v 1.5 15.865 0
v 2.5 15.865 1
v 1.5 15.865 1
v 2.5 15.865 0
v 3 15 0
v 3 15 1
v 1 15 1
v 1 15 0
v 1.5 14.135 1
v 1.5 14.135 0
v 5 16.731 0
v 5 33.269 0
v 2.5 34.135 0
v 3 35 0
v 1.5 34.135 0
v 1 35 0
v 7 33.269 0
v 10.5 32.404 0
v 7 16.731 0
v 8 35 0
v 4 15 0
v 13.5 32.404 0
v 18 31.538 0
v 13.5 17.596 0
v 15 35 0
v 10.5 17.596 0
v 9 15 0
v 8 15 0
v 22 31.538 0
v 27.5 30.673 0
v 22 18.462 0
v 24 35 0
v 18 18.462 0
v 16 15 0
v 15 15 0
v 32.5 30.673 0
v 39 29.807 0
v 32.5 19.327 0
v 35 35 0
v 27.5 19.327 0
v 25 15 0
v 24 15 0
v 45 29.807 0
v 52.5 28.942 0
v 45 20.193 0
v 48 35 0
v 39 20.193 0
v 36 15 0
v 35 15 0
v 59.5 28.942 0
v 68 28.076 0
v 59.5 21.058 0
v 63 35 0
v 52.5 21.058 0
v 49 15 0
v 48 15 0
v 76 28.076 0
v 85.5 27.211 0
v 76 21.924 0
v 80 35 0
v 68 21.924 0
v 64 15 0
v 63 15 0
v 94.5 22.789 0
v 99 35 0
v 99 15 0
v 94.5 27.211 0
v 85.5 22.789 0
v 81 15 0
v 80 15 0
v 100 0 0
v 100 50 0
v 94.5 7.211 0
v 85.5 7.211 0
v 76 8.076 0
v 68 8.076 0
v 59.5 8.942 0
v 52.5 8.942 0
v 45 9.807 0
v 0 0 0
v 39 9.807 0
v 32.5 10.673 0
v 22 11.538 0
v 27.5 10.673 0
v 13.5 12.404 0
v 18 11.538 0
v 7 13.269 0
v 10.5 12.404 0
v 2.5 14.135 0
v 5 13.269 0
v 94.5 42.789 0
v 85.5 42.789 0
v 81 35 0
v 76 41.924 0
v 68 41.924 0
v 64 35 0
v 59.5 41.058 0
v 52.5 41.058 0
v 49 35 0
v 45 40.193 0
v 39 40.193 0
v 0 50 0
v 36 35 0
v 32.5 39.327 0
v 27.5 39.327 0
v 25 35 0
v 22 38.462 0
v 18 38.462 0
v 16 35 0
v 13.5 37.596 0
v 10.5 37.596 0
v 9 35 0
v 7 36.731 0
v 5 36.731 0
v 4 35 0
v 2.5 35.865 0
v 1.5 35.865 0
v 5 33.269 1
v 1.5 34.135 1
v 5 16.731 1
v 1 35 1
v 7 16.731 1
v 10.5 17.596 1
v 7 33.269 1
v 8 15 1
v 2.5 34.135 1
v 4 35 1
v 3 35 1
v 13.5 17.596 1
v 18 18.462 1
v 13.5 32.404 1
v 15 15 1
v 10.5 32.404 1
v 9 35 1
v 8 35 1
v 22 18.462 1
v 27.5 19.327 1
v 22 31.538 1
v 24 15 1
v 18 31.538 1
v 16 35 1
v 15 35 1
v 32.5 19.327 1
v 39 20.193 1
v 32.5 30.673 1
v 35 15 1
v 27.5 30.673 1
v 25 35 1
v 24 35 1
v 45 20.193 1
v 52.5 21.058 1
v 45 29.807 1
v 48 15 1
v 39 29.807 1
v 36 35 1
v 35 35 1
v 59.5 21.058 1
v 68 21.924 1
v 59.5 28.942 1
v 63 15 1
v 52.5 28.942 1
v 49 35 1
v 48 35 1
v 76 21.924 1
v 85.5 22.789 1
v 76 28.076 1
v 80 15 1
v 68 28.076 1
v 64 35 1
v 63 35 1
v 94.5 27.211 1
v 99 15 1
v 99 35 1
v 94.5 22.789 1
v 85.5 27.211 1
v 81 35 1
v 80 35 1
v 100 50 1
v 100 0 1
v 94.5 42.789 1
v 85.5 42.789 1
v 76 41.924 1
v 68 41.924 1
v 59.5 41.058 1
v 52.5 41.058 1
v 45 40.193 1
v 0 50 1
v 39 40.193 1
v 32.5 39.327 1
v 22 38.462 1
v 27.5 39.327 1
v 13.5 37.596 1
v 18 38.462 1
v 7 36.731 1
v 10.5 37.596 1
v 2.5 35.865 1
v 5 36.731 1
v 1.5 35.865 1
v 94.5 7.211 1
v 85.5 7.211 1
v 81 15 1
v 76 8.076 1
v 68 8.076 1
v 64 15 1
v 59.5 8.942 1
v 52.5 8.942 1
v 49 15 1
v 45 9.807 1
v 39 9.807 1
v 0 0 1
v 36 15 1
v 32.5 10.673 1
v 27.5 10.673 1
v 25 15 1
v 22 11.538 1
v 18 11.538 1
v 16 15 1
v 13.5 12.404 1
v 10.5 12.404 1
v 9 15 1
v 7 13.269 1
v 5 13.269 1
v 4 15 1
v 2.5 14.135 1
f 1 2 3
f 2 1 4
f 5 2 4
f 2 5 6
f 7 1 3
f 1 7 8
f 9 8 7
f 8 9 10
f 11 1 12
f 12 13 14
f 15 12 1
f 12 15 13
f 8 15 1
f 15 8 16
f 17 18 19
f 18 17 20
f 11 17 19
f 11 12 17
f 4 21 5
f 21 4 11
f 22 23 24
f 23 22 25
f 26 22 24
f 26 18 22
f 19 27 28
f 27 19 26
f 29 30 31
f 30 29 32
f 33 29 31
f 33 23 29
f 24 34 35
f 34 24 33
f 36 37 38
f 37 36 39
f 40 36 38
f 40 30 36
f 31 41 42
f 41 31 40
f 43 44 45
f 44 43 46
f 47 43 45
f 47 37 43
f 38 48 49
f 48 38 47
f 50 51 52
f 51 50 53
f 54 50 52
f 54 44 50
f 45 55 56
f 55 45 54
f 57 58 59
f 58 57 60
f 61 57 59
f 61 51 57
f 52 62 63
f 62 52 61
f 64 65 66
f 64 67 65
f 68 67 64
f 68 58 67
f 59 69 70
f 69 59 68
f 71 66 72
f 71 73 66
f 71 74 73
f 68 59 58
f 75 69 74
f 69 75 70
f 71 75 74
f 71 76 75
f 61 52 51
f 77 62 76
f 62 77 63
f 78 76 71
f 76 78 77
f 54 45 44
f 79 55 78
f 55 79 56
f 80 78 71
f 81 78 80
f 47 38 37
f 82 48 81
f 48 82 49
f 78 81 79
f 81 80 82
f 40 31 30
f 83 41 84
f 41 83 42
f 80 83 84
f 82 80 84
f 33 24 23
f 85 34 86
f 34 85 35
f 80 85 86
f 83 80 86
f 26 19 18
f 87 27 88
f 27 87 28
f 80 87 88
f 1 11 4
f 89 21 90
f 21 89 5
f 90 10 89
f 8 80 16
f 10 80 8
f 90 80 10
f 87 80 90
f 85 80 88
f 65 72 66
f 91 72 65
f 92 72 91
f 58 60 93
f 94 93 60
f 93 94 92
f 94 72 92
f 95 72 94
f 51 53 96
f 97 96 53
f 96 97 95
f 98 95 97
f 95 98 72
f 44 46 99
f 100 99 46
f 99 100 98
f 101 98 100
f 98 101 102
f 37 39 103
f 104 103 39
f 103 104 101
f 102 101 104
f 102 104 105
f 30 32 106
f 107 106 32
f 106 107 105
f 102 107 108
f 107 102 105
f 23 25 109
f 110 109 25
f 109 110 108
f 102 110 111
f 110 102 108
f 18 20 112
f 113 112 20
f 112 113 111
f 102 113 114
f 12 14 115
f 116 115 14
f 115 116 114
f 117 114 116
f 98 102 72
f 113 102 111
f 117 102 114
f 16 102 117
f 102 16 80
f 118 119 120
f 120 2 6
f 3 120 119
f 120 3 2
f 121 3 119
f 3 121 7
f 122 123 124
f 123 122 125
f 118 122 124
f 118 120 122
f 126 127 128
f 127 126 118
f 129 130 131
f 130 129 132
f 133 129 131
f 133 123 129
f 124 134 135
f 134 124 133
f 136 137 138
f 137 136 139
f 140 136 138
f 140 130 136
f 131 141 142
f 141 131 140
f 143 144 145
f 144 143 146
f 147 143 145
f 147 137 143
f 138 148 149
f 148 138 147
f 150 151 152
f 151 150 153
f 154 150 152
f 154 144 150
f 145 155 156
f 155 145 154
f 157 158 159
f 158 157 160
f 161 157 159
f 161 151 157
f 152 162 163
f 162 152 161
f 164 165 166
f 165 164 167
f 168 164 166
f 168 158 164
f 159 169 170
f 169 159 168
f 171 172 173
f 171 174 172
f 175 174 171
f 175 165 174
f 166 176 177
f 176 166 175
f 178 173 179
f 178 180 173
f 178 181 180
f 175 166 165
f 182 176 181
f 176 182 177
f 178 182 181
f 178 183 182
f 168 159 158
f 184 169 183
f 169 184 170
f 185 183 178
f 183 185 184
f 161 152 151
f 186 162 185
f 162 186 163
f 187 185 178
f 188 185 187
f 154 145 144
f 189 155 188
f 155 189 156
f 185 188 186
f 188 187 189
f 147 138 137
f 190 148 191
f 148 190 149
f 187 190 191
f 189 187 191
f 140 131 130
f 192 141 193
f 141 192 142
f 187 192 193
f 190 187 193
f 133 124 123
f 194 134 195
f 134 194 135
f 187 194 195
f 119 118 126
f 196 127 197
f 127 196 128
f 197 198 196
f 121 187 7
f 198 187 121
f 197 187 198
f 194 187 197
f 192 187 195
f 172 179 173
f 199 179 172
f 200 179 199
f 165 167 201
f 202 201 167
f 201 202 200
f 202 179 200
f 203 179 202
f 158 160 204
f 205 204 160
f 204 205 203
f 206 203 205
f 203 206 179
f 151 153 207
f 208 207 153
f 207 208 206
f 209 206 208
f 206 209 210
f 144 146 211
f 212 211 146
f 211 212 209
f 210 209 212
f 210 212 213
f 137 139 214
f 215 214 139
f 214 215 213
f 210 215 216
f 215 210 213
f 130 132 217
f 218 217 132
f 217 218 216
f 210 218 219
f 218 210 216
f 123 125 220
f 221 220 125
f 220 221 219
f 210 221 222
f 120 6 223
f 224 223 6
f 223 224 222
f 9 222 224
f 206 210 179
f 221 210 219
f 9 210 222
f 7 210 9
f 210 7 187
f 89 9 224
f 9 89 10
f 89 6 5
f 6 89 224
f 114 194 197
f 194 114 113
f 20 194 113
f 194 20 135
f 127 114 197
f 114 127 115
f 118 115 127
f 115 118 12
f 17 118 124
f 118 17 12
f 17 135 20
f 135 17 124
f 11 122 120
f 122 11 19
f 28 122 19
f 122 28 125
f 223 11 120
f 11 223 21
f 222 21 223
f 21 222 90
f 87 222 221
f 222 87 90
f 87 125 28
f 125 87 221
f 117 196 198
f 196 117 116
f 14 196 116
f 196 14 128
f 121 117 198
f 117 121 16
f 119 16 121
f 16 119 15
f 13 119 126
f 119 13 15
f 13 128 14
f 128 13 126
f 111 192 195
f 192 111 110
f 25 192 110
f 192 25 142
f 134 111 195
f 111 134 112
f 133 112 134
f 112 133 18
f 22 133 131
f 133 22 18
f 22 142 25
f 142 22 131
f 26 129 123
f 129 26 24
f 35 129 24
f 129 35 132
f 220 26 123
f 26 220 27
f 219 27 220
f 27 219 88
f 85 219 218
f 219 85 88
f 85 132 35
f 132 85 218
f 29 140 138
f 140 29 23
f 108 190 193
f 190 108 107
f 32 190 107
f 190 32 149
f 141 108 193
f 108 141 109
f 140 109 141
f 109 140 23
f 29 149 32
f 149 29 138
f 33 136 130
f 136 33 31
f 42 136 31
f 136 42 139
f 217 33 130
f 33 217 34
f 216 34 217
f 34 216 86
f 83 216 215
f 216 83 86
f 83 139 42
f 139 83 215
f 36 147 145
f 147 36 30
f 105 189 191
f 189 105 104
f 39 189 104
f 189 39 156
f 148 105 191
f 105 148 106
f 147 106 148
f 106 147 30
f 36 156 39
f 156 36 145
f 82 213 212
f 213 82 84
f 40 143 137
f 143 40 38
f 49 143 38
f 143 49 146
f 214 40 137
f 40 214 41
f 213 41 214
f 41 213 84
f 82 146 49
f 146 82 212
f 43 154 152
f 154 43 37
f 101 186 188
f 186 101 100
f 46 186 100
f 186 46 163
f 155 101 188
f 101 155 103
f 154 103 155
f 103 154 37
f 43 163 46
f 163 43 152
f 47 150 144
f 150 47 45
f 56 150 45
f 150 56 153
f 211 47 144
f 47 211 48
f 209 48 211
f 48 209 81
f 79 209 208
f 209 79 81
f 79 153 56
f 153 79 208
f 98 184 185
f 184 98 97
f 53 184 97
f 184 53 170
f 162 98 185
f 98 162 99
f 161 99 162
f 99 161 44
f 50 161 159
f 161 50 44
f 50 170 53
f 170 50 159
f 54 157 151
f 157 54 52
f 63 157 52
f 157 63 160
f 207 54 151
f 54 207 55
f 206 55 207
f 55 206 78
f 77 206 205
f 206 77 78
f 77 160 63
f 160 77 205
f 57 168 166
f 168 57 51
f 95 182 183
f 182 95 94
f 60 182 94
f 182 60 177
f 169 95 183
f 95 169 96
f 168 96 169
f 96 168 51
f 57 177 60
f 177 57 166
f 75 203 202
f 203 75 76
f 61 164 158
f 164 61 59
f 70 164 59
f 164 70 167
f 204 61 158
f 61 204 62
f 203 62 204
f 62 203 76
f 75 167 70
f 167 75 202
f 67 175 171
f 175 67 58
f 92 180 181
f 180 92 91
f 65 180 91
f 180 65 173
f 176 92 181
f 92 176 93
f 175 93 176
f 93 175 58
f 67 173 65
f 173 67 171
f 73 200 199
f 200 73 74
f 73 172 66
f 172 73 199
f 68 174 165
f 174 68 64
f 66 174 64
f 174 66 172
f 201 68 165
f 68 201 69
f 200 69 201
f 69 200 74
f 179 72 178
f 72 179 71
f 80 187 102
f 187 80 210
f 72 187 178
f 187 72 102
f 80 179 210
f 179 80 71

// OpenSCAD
difference() {
  translate([50.0000000000, 25.0000000000, 0.5000000000]) {
    scale([100.0000000000, 50.0000000000, 1.0000000000]) {
      translate([-0.5000000000, -0.5000000000, -0.5000000000]) {
        cube([1, 1, 1]);
      }
    }
  }
  union() {
    union() {
      union() {
        union() {
          union() {
            union() {
              union() {
                union() {
                  union() {
                    union() {
                      union() {
                        union() {
                          union() {
                            union() {
                              union() {
                                union() {
                                  union() {
                                    translate([2.0000000000, 15.0000000000, 0.5000000000]) {
                                      scale([2.0000000000, 1.7320000000, 1.0000000000]) {
                                        rotate([0.0000000000, 0.0000000000, -0.0000000000]) {
                                          scale([0.5, 0.577, 1]) cylinder($fn = 6, center = true);
                                        }
                                      }
                                    }
                                    translate([6.0000000000, 35.0000000000, 0.5000000000]) {
                                      scale([4.0000000000, 3.4640000000, 1.0000000000]) {
                                        rotate([0.0000000000, 0.0000000000, -0.0000000000]) {
                                          scale([0.5, 0.577, 1]) cylinder($fn = 6, center = true);
                                        }
                                      }
                                    }
                                  }
                                  translate([6.0000000000, 15.0000000000, 0.5000000000]) {
                                    scale([4.0000000000, 3.4640000000, 1.0000000000]) {
                                      rotate([0.0000000000, 0.0000000000, -0.0000000000]) {
                                        scale([0.5, 0.577, 1]) cylinder($fn = 6, center = true);
                                      }
                                    }
                                  }
                                }
                                translate([2.0000000000, 35.0000000000, 0.5000000000]) {
                                  scale([2.0000000000, 1.7320000000, 1.0000000000]) {
                                    rotate([0.0000000000, 0.0000000000, -0.0000000000]) {
                                      scale([0.5, 0.577, 1]) cylinder($fn = 6, center = true);
                                    }
                                  }
                                }
                              }
                              translate([12.0000000000, 35.0000000000, 0.5000000000]) {
                                scale([6.0000000000, 5.1960000000, 1.0000000000]) {
                                  rotate([0.0000000000, 0.0000000000, -0.0000000000]) {
                                    scale([0.5, 0.577, 1]) cylinder($fn = 6, center = true);
                                  }
                                }
                              }
                            }
                            translate([12.0000000000, 15.0000000000, 0.5000000000]) {
                              scale([6.0000000000, 5.1960000000, 1.0000000000]) {
                                rotate([0.0000000000, 0.0000000000, -0.0000000000]) {
                                  scale([0.5, 0.577, 1]) cylinder($fn = 6, center = true);
                                }
                              }
                            }
                          }
                          translate([20.0000000000, 35.0000000000, 0.5000000000]) {
                            scale([8.0000000000, 6.9280000000, 1.0000000000]) {
                              rotate([0.0000000000, 0.0000000000, -0.0000000000]) {
                                scale([0.5, 0.577, 1]) cylinder($fn = 6, center = true);
                              }
                            }
                          }
                        }
                        translate([20.0000000000, 15.0000000000, 0.5000000000]) {
                          scale([8.0000000000, 6.9280000000, 1.0000000000]) {
                            rotate([0.0000000000, 0.0000000000, -0.0000000000]) {
                              scale([0.5, 0.577, 1]) cylinder($fn = 6, center = true);
                            }
                          }
                        }
                      }
                      translate([30.0000000000, 35.0000000000, 0.5000000000]) {
                        scale([10.0000000000, 8.6600000000, 1.0000000000]) {
                          rotate([0.0000000000, 0.0000000000, -0.0000000000]) {
                            scale([0.5, 0.577, 1]) cylinder($fn = 6, center = true);
                          }
                        }
                      }
                    }
                    translate([30.0000000000, 15.0000000000, 0.5000000000]) {
                      scale([10.0000000000, 8.6600000000, 1.0000000000]) {
                        rotate([0.0000000000, 0.0000000000, -0.0000000000]) {
                          scale([0.5, 0.577, 1]) cylinder($fn = 6, center = true);
                        }
                      }
                    }
                  }
                  translate([42.0000000000, 35.0000000000, 0.5000000000]) {
                    scale([12.0000000000, 10.3920000000, 1.0000000000]) {
                      rotate([0.0000000000, 0.0000000000, -0.0000000000]) {
                        scale([0.5, 0.577, 1]) cylinder($fn = 6, center = true);
                      }
                    }
                  }
                }
                translate([42.0000000000, 15.0000000000, 0.5000000000]) {
                  scale([12.0000000000, 10.3920000000, 1.0000000000]) {
                    rotate([0.0000000000, 0.0000000000, -0.0000000000]) {
                      scale([0.5, 0.577, 1]) cylinder($fn = 6, center = true);
                    }
                  }
                }
              }
              translate([56.0000000000, 35.0000000000, 0.5000000000]) {
                scale([14.0000000000, 12.1240000000, 1.0000000000]) {
                  rotate([0.0000000000, 0.0000000000, -0.0000000000]) {
                    scale([0.5, 0.577, 1]) cylinder($fn = 6, center = true);
                  }
                }
              }
            }
            translate([56.0000000000, 15.0000000000, 0.5000000000]) {
              scale([14.0000000000, 12.1240000000, 1.0000000000]) {
                rotate([0.0000000000, 0.0000000000, -0.0000000000]) {
                  scale([0.5, 0.577, 1]) cylinder($fn = 6, center = true);
                }
              }
            }
          }
          translate([72.0000000000, 35.0000000000, 0.5000000000]) {
            scale([16.0000000000, 13.8560000000, 1.0000000000]) {
              rotate([0.0000000000, 0.0000000000, -0.0000000000]) {
                scale([0.5, 0.577, 1]) cylinder($fn = 6, center = true);
              }
            }
          }
        }
        translate([72.0000000000, 15.0000000000, 0.5000000000]) {
          scale([16.0000000000, 13.8560000000, 1.0000000000]) {
            rotate([0.0000000000, 0.0000000000, -0.0000000000]) {
              scale([0.5, 0.577, 1]) cylinder($fn = 6, center = true);
            }
          }
        }
      }
      translate([90.0000000000, 35.0000000000, 0.5000000000]) {
        scale([18.0000000000, 15.5880000000, 1.0000000000]) {
          rotate([0.0000000000, 0.0000000000, -0.0000000000]) {
            scale([0.5, 0.577, 1]) cylinder($fn = 6, center = true);
          }
        }
      }
    }
    translate([90.0000000000, 15.0000128460, 0.5000000000]) {
      scale([18.0000000000, 15.5880000000, 1.0000000000]) {
        rotate([0.0000000000, 0.0000000000, -0.0000000000]) {
          scale([0.5, 0.577, 1]) cylinder($fn = 6, center = true);
        }
      }
    }
  }
}
